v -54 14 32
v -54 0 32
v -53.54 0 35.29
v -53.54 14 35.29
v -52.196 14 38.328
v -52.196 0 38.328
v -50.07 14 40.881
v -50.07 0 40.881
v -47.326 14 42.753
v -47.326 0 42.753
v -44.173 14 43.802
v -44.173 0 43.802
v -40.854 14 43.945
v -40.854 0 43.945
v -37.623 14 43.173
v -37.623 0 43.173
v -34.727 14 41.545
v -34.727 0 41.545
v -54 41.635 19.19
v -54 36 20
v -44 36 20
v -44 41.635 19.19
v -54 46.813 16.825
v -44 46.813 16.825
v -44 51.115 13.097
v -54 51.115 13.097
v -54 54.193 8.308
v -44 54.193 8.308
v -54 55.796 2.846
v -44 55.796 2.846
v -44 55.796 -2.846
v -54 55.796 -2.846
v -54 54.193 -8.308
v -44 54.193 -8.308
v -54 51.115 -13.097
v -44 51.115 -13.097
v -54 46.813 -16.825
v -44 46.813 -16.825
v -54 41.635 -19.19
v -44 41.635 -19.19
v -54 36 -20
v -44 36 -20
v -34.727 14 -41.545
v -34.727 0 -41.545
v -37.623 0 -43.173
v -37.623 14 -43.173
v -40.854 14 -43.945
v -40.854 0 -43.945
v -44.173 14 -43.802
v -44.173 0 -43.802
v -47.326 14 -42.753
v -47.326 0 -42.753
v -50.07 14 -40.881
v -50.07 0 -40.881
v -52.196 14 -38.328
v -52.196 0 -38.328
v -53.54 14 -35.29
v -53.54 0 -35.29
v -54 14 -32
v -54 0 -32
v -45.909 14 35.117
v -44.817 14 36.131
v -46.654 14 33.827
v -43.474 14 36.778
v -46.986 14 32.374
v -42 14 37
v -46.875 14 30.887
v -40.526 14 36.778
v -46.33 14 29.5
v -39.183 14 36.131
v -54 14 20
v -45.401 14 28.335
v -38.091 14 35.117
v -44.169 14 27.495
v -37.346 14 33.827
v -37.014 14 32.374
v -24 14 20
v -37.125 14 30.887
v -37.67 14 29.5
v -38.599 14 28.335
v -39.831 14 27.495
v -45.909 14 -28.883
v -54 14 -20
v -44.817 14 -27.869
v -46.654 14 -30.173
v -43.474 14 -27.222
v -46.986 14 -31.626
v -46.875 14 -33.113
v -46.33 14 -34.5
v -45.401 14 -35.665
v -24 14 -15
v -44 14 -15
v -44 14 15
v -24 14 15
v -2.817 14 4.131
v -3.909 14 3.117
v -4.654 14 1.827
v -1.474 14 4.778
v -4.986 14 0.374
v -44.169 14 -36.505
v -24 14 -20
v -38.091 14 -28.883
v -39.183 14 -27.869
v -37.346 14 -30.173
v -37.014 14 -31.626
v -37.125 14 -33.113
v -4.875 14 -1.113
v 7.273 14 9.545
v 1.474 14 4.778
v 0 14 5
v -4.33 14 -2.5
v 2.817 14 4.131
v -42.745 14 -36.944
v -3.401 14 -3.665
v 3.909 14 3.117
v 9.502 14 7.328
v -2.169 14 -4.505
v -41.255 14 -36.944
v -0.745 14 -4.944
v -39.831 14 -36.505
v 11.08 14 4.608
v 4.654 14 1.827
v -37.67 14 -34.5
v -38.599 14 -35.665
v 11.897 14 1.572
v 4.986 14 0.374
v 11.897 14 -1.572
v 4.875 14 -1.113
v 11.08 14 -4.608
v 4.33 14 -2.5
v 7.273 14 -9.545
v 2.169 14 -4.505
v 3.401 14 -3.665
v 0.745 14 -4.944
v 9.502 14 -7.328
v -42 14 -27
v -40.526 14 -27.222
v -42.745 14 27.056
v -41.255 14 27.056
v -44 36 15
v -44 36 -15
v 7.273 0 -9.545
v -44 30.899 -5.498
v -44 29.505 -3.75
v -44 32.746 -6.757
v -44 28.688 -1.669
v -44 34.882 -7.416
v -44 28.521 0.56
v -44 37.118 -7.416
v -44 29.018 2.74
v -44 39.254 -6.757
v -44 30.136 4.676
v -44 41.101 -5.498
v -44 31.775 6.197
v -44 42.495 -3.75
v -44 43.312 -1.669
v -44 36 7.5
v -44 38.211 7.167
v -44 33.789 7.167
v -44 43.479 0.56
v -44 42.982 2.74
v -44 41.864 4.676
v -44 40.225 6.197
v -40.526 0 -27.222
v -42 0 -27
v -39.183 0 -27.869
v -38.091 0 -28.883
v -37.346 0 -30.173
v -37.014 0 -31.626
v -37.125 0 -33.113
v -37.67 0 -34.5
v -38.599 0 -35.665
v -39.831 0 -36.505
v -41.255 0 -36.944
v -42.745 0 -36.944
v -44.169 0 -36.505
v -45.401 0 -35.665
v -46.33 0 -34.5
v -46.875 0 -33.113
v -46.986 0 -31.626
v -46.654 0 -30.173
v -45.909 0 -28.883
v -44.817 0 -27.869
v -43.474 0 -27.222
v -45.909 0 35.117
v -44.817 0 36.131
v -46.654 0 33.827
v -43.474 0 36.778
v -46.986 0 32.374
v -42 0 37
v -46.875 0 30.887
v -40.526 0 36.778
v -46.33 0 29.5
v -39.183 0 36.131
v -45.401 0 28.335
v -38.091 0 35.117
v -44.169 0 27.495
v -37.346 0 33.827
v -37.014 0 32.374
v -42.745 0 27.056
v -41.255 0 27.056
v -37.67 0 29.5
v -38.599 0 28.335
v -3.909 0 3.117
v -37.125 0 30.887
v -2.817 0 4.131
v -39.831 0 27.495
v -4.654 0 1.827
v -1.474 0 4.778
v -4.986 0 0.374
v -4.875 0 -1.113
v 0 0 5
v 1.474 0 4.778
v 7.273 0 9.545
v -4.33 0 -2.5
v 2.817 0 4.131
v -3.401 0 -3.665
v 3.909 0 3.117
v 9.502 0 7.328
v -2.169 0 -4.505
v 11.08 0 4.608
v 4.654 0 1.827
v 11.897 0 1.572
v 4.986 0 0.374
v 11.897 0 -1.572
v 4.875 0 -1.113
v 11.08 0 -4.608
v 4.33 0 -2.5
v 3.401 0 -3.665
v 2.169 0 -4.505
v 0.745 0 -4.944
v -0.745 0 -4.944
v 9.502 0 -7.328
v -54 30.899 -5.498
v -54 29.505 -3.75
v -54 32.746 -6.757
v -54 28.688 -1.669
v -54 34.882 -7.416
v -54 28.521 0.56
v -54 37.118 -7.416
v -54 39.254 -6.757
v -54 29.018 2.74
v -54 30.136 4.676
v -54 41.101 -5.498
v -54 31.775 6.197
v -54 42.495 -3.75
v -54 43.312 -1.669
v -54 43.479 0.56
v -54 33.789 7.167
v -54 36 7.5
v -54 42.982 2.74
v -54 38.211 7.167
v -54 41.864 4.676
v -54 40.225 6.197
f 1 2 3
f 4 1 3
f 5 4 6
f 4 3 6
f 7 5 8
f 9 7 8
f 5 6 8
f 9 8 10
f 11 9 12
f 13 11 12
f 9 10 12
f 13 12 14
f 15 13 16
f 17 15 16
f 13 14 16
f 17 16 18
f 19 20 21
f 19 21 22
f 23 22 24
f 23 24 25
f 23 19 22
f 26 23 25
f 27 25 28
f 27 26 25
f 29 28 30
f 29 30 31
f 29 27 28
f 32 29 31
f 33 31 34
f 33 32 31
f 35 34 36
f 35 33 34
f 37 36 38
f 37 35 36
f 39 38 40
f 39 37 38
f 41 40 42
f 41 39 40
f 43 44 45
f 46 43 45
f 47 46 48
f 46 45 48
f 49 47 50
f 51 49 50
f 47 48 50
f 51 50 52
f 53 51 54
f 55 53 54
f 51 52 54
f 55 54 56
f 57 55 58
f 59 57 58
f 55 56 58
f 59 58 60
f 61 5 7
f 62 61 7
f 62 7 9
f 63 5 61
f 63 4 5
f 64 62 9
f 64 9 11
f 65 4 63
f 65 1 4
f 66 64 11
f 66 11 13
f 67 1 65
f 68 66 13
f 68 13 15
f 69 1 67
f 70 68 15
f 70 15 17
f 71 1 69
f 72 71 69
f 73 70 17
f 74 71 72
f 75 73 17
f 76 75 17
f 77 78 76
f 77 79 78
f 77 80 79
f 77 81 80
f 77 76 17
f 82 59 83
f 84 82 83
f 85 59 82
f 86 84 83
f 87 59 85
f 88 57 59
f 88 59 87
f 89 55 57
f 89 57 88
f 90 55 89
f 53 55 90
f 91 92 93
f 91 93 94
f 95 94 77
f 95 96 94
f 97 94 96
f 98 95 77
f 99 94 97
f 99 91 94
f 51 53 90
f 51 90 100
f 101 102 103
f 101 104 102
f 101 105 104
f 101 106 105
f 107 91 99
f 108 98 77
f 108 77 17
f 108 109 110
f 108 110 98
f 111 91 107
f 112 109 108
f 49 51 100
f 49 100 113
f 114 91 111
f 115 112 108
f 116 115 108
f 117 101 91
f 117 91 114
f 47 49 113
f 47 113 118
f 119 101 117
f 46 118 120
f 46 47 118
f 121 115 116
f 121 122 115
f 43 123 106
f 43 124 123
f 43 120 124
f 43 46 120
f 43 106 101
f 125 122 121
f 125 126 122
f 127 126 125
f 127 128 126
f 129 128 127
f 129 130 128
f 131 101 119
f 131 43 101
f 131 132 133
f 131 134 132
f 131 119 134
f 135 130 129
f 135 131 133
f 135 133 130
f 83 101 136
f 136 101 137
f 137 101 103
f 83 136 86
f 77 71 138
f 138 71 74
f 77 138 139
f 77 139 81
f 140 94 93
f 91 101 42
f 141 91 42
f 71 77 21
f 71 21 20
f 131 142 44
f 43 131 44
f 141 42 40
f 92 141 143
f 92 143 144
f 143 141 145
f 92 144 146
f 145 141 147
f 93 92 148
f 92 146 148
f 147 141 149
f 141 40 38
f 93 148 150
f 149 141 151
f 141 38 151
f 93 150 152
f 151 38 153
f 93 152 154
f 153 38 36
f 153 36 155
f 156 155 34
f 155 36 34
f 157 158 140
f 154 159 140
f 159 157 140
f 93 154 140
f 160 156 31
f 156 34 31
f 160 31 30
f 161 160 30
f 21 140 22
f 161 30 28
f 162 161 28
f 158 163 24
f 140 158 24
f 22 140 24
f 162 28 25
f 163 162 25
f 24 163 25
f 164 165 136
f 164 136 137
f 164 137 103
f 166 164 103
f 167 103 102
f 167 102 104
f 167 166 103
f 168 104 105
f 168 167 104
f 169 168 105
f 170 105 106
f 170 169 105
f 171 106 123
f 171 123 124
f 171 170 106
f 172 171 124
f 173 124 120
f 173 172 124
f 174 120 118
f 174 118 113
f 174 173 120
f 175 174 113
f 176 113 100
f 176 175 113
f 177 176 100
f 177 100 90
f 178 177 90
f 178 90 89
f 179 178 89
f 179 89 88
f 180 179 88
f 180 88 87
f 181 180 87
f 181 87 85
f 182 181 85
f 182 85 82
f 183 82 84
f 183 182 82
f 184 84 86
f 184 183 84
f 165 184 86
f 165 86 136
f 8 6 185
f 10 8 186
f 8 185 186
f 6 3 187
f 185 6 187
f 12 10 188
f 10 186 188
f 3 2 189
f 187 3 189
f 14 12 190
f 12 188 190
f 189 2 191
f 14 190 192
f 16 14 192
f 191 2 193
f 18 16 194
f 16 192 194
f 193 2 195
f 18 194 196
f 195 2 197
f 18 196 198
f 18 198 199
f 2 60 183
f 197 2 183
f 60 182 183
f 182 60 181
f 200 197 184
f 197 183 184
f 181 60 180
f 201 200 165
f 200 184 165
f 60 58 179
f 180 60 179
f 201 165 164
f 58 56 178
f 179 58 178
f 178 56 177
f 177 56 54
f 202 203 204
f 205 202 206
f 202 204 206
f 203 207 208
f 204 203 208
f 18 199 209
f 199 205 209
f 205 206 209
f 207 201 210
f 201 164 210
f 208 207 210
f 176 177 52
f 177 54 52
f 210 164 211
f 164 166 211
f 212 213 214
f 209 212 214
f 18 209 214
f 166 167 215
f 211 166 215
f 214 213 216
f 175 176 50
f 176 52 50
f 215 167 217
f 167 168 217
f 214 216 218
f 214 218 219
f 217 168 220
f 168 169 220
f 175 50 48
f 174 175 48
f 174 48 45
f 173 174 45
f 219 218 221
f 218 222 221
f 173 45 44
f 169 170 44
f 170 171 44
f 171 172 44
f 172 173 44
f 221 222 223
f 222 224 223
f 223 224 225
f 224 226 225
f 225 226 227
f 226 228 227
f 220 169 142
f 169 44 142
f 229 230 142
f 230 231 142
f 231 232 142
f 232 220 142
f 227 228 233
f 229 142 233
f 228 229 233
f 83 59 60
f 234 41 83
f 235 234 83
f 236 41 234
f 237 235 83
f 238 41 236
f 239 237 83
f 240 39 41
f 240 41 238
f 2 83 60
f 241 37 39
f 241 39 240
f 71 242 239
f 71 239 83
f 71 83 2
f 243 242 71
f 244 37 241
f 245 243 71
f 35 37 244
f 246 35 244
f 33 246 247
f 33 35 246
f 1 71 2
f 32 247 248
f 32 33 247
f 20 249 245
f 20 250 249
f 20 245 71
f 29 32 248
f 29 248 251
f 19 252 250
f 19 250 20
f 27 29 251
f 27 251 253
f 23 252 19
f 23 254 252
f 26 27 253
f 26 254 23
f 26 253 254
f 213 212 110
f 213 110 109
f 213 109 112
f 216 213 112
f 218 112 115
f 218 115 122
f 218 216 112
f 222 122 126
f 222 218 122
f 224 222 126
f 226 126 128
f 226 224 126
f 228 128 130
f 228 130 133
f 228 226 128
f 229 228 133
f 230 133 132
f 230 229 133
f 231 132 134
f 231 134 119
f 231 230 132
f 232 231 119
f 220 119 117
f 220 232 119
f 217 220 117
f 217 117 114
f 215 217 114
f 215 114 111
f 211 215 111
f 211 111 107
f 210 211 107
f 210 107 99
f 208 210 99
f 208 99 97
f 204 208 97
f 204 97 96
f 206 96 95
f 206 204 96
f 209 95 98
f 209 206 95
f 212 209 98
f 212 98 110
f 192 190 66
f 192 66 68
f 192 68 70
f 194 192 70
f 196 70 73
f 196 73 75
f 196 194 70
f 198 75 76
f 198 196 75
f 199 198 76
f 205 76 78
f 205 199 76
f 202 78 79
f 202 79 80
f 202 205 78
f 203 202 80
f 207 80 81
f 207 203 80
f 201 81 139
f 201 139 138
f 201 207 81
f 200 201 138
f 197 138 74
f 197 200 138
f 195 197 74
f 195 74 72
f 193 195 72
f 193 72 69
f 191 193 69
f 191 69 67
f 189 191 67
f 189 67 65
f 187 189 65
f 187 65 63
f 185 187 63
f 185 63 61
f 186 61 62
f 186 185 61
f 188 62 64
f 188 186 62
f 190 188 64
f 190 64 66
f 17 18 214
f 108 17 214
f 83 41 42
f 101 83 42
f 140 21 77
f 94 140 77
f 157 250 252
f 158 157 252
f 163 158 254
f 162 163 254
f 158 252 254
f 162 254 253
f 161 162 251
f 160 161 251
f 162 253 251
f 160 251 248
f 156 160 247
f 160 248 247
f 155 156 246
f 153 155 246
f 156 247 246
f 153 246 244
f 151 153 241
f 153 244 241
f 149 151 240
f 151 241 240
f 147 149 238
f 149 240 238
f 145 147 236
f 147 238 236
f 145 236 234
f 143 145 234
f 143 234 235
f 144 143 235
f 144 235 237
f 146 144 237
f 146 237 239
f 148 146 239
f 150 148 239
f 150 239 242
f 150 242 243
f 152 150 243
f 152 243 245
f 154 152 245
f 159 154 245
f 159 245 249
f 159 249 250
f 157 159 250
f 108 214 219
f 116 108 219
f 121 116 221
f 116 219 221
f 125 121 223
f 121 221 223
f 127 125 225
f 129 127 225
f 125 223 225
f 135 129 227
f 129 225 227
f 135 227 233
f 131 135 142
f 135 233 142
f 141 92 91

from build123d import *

# Parameters (mm, degrees)
SKETCH1_R           = 5
BOSS_EXTRUDE1_DEPTH = 14
SKETCH2_W           = 10
SKETCH2_H           = 40
BOSS_EXTRUDE2_DEPTH = 22
SKETCH4_R           = 20
BOSS_EXTRUDE3_DEPTH = 10
HOLE1_D             = 15
BOSS_EXTRUDE4_DEPTH = 5
BOSS_EXTRUDE5_DEPTH = 5


with BuildPart() as part:
    # Sketch1 → Boss-Extrude1 (new body)
    with BuildSketch(Plane(origin=(0, 0, 0), x_dir=(1, 0, 0), z_dir=(0, 1, 0))):
        with BuildLine():
            Line((-54, 32), (-54, -32))
            ThreePointArc((-54, -32), (-47.325869741, -42.753376749), (-34.727481417, -41.54518064))
            Line((-34.727481417, -41.54518064), (7.272518583, -9.54518064))
            ThreePointArc((7.272518583, -9.54518064), (12, 0), (7.272518583, 9.54518064))
            Line((7.272518583, 9.54518064), (-34.727481417, 41.54518064))
            ThreePointArc((-34.727481417, 41.54518064), (-47.325869741, 42.753376749), (-54, 32))
        make_face()
        with Locations(Location((-42, 32, 0), (0, 0, 270))):
            Circle(SKETCH1_R, mode=Mode.SUBTRACT)
        with Locations(Location((0, 0, 0), (0, 0, 270))):
            Circle(SKETCH1_R, mode=Mode.SUBTRACT)
        with Locations(Location((-42, -32, 0), (0, 0, 270))):
            Circle(SKETCH1_R, mode=Mode.SUBTRACT)
    extrude(amount=BOSS_EXTRUDE1_DEPTH)

    # Sketch2 → Boss-Extrude2 (add)
    with BuildSketch(Plane(origin=(0, 14, 0), x_dir=(1, 0, 0), z_dir=(0, 1, 0))):
        with Locations((-49, 0)):
            Rectangle(SKETCH2_W, SKETCH2_H)
    extrude(amount=BOSS_EXTRUDE2_DEPTH)

    # Sketch4 → Boss-Extrude3 (add)
    with BuildSketch(Plane.ZY.offset(54)):
        with Locations((0, 36)):
            Circle(SKETCH4_R)
    extrude(amount=-BOSS_EXTRUDE3_DEPTH)

    # Hole1 (through all)
    with Locations(Plane(origin=(-44, 0, 0), x_dir=(0, 0, -1), z_dir=(1, 0, 0))):
        with Locations((0, 36)):
            Hole(HOLE1_D / 2)

    # Sketch7 → Boss-Extrude4 (add)
    with BuildSketch(Plane.XY.offset(20)):
        Polygon((-44, 36), (-24, 14), (-44, 14), align=None)
    extrude(amount=-BOSS_EXTRUDE4_DEPTH)

    # Sketch8 → Boss-Extrude5 (add)
    with BuildSketch(Plane(origin=(0, 0, -20), x_dir=(-1, 0, 0), z_dir=(0, 0, -1))):
        Polygon((44, 36), (44, 14), (24, 14), align=None)
    extrude(amount=-BOSS_EXTRUDE5_DEPTH)


solid = part.part
